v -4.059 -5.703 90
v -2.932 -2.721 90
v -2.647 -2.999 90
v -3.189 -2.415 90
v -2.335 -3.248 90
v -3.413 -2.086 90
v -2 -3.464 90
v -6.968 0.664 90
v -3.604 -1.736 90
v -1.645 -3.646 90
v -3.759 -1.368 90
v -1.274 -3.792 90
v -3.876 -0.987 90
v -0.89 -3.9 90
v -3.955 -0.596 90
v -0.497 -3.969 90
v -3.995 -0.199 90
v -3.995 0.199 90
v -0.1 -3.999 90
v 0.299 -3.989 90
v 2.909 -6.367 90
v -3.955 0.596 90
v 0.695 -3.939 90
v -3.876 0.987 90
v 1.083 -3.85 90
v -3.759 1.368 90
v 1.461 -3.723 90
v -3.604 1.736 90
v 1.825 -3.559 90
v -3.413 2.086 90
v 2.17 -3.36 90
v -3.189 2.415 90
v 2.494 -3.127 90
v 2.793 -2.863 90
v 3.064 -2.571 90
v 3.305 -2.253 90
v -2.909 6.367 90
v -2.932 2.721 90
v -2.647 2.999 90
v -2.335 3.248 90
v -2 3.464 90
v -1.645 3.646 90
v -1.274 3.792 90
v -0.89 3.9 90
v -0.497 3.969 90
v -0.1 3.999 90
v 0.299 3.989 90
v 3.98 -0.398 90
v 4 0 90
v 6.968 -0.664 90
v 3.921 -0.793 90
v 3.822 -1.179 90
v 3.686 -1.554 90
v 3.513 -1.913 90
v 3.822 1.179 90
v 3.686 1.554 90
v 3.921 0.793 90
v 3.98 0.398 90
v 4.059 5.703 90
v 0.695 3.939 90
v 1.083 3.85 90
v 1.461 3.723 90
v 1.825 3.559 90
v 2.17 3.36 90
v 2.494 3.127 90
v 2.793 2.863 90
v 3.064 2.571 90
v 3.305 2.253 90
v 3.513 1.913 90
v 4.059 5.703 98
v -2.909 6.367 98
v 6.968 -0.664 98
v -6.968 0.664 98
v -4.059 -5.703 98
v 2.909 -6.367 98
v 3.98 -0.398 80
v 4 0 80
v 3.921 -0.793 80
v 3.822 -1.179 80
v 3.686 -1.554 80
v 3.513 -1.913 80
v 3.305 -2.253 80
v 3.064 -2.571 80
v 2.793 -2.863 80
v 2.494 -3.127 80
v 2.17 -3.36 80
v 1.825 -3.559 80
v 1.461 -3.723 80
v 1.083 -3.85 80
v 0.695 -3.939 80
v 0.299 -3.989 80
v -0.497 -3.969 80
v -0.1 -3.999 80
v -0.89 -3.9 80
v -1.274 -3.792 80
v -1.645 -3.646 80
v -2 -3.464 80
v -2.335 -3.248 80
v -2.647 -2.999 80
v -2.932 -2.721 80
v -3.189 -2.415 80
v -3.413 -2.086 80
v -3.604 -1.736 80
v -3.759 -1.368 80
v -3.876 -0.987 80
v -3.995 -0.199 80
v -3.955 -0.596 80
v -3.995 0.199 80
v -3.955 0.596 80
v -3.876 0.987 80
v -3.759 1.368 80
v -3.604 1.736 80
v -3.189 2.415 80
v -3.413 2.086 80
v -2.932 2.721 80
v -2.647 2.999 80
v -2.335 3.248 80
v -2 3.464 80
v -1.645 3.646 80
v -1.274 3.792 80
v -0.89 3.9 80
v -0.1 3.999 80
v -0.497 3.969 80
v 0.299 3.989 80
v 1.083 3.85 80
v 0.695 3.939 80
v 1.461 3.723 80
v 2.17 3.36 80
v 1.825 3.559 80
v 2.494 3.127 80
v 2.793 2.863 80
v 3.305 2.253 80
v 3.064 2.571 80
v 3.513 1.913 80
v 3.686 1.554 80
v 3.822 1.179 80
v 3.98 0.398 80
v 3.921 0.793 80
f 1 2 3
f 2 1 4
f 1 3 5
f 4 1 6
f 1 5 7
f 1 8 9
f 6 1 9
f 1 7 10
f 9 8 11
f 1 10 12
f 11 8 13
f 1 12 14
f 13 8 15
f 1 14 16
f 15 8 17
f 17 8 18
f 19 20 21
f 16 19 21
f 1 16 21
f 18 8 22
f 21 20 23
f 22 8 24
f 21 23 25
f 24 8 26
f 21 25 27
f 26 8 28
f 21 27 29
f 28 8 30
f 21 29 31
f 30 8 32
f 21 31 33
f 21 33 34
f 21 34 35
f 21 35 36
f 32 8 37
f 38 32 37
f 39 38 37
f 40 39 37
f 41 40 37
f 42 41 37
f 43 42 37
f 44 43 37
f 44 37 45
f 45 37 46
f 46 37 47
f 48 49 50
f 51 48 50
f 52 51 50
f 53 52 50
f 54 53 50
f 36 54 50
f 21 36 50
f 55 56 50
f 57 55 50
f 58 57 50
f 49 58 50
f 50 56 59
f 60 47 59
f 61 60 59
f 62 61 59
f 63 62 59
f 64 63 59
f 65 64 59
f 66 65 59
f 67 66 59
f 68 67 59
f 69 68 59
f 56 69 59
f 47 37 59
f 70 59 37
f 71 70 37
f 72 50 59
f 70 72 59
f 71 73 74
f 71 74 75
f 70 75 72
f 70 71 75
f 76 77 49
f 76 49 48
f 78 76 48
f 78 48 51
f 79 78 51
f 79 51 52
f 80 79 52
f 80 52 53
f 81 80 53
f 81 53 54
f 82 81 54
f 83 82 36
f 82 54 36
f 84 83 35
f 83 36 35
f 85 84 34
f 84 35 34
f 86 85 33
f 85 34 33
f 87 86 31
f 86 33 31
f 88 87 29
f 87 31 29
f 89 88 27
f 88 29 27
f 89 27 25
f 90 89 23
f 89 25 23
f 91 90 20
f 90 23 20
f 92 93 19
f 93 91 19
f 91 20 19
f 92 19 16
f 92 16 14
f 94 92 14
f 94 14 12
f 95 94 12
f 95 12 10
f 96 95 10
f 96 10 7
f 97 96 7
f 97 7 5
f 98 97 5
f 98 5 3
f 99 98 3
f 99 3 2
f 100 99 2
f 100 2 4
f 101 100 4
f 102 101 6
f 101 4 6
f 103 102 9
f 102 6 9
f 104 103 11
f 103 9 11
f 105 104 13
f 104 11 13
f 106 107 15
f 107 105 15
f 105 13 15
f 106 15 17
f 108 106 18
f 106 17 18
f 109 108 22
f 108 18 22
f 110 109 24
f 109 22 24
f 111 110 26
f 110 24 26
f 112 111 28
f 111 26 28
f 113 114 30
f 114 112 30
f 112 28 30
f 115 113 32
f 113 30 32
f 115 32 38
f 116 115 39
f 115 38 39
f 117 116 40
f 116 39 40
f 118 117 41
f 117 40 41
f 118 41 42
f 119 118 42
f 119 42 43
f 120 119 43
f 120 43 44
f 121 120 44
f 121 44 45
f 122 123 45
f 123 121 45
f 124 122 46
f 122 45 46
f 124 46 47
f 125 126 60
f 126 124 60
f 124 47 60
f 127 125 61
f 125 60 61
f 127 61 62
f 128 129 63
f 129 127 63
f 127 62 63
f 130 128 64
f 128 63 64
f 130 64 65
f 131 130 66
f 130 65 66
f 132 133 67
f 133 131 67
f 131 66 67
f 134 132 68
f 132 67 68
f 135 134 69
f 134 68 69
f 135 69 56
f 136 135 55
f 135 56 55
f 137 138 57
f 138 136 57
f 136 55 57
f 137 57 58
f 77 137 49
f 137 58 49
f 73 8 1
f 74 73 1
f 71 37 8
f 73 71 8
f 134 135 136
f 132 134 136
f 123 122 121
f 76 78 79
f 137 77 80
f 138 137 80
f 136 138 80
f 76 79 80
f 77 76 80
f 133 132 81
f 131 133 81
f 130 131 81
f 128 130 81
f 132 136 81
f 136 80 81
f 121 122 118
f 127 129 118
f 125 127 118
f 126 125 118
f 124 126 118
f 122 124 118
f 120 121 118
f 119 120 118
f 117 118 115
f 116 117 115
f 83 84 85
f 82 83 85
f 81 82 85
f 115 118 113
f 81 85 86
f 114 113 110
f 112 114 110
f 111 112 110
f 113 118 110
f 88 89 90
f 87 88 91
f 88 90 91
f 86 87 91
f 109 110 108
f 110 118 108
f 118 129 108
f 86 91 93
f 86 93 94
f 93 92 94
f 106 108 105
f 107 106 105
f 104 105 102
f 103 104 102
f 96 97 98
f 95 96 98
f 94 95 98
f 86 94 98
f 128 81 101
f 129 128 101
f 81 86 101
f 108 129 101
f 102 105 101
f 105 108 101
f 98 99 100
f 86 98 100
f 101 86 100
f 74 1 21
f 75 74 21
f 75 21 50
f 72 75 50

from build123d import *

# Parameters (mm, degrees)
F3_DEPTH = 8
F4_W     = 5
F4_H     = 80


with BuildPart() as f1:
    # F0 (on Front) → F1 (revolve)
    with BuildSketch(Plane.XZ):
        Polygon((4, 0), (4, 90), (0, 90), (0, 65), (0, 0), align=None)
    revolve(axis=Axis((0, 0, 32.5), (0, 0, -1)))

    # F2 (on face) → F3 (join)
    with BuildSketch(Plane.XY.offset(90)):
        Polygon((6.968457, -0.663784), (4.059082, 5.702969), (-2.909374, 6.366753), (-6.968457, 0.663784), (-4.059082, -5.702969), (2.909374, -6.366753), align=None)
    extrude(amount=F3_DEPTH)

    # F4 (on Front) → F5 (revolve, cut)
    with BuildSketch(Plane.XZ):
        with Locations((2.5, 40)):
            Rectangle(F4_W, F4_H)
    revolve(axis=Axis((0, 0, 40), (0, 0, -1)), mode=Mode.SUBTRACT)


solid = f1.part
